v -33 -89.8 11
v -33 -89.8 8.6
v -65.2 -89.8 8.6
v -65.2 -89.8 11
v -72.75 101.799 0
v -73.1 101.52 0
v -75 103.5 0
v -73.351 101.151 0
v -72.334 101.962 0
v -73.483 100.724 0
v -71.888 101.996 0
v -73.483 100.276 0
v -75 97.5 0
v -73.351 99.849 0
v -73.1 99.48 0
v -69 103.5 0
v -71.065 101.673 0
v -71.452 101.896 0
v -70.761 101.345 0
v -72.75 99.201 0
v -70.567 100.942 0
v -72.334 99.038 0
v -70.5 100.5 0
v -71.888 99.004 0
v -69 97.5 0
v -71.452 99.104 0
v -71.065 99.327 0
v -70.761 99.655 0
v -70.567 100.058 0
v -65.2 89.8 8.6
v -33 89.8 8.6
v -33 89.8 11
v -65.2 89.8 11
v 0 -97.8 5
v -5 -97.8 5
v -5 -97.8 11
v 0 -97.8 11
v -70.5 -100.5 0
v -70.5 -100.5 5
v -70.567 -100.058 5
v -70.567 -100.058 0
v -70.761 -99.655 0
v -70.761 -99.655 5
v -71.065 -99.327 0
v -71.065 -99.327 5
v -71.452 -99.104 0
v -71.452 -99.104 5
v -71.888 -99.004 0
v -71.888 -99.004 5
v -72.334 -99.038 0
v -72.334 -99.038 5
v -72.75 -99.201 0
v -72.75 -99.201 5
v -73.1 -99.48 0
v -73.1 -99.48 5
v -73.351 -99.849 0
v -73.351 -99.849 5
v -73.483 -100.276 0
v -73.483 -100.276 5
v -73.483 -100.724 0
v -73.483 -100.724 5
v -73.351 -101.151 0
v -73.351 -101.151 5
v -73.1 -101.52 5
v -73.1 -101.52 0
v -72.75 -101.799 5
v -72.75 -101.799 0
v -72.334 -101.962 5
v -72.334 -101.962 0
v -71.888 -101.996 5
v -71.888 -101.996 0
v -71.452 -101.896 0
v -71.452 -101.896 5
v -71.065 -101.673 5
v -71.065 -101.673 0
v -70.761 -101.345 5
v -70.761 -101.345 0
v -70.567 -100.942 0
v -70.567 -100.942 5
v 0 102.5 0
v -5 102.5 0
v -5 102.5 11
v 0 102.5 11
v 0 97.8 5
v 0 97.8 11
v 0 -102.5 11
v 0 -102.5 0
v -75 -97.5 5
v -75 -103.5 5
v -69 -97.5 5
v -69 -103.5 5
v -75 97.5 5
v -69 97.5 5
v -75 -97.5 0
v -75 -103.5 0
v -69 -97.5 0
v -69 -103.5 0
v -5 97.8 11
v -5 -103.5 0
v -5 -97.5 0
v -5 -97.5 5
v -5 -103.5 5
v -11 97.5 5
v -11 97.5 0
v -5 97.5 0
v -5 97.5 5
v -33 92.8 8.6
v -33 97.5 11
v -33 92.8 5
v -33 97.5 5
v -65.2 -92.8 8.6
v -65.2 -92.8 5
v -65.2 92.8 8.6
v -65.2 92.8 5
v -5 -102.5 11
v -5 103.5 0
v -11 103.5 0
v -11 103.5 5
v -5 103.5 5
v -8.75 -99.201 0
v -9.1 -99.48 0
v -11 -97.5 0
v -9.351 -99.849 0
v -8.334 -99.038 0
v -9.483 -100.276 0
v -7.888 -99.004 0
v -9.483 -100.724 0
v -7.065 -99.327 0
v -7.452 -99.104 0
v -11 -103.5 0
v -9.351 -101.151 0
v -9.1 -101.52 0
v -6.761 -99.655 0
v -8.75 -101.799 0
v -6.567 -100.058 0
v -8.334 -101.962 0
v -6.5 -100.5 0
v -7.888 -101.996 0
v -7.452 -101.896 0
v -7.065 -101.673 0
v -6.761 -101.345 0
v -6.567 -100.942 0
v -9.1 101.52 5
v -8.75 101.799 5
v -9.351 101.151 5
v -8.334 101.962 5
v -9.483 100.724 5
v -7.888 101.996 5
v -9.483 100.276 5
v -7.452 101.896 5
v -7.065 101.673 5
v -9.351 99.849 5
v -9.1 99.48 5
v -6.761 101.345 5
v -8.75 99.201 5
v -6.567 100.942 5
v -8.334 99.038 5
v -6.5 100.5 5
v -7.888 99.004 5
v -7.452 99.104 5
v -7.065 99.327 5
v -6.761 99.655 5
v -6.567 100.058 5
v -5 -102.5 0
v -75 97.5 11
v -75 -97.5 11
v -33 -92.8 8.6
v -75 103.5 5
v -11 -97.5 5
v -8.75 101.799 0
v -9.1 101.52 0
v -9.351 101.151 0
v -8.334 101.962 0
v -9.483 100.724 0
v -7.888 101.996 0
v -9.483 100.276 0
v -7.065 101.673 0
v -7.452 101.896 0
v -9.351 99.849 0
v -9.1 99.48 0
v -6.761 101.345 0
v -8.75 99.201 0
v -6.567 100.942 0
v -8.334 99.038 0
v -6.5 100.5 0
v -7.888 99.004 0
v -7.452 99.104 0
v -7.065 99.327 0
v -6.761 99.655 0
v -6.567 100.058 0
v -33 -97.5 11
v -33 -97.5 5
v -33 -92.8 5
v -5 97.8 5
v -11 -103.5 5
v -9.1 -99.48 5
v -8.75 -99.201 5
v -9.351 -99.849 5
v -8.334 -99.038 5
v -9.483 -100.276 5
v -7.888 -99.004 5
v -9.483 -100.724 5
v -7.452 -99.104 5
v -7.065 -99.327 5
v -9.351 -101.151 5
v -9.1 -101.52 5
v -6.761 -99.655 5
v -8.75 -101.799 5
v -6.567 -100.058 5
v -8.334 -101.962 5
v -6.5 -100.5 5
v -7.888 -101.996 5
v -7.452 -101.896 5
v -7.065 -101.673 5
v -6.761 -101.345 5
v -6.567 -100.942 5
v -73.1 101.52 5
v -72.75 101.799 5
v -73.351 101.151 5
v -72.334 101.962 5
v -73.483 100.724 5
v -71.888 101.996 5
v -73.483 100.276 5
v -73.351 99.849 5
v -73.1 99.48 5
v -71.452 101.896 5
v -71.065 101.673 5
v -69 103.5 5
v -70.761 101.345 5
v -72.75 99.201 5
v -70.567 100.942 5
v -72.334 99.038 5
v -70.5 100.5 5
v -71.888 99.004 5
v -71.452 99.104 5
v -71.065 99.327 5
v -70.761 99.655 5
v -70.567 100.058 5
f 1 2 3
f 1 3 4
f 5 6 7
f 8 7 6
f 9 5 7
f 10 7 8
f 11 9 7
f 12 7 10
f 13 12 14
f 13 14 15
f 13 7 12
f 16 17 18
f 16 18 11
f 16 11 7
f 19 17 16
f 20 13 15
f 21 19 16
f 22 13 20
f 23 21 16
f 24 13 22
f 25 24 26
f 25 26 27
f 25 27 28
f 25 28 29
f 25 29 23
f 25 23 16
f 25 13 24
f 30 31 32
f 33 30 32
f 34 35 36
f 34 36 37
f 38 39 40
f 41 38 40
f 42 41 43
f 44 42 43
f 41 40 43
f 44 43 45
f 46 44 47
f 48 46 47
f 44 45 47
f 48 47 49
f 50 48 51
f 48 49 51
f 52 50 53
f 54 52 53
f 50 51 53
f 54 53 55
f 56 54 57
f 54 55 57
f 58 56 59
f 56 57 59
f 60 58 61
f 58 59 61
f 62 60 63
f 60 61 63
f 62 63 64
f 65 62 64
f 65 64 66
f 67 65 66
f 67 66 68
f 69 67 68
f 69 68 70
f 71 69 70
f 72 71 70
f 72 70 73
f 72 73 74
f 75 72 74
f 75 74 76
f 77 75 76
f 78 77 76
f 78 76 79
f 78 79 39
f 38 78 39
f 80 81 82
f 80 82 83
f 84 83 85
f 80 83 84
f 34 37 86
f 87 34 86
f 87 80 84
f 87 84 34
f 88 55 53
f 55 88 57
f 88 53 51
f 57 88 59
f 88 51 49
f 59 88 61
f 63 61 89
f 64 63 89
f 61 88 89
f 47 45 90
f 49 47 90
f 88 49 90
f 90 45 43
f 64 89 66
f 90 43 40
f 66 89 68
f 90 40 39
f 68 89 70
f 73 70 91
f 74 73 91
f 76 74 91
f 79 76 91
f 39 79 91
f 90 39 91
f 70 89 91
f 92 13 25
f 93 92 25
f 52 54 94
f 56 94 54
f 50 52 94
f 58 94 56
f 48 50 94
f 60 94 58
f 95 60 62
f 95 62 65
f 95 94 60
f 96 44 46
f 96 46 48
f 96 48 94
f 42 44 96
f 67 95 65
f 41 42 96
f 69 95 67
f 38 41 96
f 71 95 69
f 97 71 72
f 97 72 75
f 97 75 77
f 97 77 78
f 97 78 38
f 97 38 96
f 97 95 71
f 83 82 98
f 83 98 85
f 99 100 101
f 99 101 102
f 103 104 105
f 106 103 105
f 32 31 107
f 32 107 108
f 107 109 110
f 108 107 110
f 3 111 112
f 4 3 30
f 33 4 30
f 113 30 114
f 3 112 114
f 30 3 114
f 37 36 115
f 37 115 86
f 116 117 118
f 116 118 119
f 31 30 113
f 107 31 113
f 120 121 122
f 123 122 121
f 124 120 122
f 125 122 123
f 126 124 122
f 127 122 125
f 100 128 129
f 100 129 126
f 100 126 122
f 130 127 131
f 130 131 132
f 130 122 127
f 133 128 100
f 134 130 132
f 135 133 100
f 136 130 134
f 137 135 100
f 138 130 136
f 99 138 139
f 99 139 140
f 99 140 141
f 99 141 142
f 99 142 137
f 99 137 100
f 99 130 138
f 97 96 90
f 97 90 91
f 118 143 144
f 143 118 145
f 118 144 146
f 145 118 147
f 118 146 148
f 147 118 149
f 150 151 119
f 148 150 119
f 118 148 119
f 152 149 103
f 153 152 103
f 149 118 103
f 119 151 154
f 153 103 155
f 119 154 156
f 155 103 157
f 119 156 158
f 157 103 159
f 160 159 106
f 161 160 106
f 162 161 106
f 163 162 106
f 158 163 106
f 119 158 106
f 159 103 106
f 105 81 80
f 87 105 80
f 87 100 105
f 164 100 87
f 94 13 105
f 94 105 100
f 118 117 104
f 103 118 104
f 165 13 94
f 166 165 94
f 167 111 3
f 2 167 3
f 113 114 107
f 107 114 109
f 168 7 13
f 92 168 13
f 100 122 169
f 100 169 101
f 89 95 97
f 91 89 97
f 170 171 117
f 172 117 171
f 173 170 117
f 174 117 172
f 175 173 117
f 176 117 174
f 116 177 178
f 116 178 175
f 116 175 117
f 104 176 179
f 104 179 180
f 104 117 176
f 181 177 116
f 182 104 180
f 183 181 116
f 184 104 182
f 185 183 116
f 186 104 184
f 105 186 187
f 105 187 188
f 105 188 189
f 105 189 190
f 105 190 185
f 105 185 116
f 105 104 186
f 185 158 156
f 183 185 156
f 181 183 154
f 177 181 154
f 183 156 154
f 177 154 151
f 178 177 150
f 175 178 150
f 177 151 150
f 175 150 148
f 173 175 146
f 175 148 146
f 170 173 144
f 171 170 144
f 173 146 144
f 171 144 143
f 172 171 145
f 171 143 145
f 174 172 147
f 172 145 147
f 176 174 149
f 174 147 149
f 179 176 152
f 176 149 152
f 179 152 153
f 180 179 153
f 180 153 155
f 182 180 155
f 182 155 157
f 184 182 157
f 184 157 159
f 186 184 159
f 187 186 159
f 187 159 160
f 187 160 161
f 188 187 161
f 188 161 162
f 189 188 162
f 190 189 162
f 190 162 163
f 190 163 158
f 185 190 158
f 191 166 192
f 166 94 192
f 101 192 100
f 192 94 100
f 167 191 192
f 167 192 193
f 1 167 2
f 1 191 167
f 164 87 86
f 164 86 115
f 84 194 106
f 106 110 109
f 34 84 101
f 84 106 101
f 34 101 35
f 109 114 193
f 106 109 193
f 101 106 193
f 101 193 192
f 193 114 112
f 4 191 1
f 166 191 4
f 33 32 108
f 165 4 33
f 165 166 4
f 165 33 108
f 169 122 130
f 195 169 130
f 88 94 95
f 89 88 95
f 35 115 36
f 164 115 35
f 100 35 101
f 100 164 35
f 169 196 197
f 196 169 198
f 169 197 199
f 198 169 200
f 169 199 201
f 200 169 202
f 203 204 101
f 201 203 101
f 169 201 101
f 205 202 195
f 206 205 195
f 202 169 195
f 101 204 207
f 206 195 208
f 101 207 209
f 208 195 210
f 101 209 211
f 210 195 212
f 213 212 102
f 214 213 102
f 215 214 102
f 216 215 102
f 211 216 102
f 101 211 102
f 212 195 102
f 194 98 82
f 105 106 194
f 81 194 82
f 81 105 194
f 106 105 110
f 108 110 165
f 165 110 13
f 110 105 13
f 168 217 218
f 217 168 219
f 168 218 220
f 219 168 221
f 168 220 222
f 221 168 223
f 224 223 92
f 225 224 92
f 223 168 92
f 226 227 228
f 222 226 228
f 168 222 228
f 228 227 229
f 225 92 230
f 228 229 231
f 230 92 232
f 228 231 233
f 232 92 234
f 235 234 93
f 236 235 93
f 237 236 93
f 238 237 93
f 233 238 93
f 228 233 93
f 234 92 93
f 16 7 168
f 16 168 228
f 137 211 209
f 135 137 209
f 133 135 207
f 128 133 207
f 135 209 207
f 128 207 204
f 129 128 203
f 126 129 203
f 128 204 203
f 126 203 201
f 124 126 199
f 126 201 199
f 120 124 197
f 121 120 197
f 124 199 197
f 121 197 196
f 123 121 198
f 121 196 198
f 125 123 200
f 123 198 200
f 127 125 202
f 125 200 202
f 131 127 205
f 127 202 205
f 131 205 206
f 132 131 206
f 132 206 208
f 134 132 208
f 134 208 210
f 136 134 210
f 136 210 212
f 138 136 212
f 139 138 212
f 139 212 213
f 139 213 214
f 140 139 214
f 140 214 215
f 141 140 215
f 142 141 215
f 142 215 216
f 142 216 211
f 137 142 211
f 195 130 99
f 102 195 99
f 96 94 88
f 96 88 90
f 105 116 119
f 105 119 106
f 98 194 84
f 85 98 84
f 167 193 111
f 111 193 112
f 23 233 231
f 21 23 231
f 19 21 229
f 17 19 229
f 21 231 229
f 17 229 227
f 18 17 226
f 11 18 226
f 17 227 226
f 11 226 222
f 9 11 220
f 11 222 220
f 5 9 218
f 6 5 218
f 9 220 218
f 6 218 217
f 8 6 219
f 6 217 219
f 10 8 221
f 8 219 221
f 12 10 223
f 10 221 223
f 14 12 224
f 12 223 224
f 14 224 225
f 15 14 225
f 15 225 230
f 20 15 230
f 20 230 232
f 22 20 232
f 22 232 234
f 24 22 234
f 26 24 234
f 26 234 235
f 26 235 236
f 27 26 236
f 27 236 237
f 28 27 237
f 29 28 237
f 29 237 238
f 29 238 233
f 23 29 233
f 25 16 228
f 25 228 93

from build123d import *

# Parameters (mm, degrees)
BOSS_EXTRUDE1_DEPTH   = 5
SKETCH4_W             = 5
SKETCH4_H             = 4.7
BOSS_EXTRUDE2_DEPTH   = 6
SKETCH5_W             = 3
SKETCH5_H             = 2.4
BOSS_EXTRUDE3_DEPTH   = 32.2
SKETCH6_W             = 6
SKETCH6_H             = 6
BOSS_EXTRUDE4_DEPTH   = 5
BOSS_EXTRUDE4_2_DEPTH = 5
BOSS_EXTRUDE4_3_DEPTH = 5
BOSS_EXTRUDE4_4_DEPTH = 5
SKETCH7_R             = 1.5
CUT_EXTRUDE1_DEPTH    = 6


with BuildPart() as part:
    # Sketch1 → Boss-Extrude1 (new body)
    with BuildSketch(Plane(origin=(0, 0, 0), x_dir=(0, 1, 0), z_dir=(0, 0, 1))):
        Polygon((-97.5, 5), (-97.5, 75), (97.5, 75), (97.5, 5), (102.5, 5), (102.5, 0), (-102.5, 0), (-102.5, 5), align=None)
    extrude(amount=BOSS_EXTRUDE1_DEPTH)

    # Sketch4 → Boss-Extrude2 (add)
    with BuildSketch(Plane.XY.offset(5)):
        Polygon((-75, 97.5), (-75, -97.5), (-33, -97.5), (-33, -92.8), (-65.2, -92.8), (-65.2, 92.8), (-33, 92.8), (-33, 97.5), align=None)
        with Locations((-2.5, 100.15)):
            Rectangle(SKETCH4_W, SKETCH4_H)
        with Locations((-2.5, -100.15)):
            Rectangle(SKETCH4_W, SKETCH4_H)
    extrude(amount=BOSS_EXTRUDE2_DEPTH)

    # Sketch5 → Boss-Extrude3 (add)
    with BuildSketch(Plane.YZ.offset(-65.2)):
        with Locations((-91.3, 9.8)):
            Rectangle(SKETCH5_W, SKETCH5_H)
        with Locations((91.3, 9.8)):
            Rectangle(SKETCH5_W, SKETCH5_H)
    extrude(amount=BOSS_EXTRUDE3_DEPTH)


with BuildPart() as body_2:
    # Sketch6 → Boss-Extrude4 (new body)
    with BuildSketch(Plane(origin=(0, 0, 0), x_dir=(1, 0, 0), z_dir=(0, 0, -1))):
        with Locations((-8, 100.5)):
            Rectangle(SKETCH6_W, SKETCH6_H)
    extrude(amount=-BOSS_EXTRUDE4_DEPTH)


with BuildPart() as body_3:
    # Sketch6 → Boss-Extrude4 2 (new body)
    with BuildSketch(Plane(origin=(0, 0, 0), x_dir=(1, 0, 0), z_dir=(0, 0, -1))):
        with Locations((-72, 100.5)):
            Rectangle(SKETCH6_W, SKETCH6_H)
    extrude(amount=-BOSS_EXTRUDE4_2_DEPTH)


with BuildPart() as body_4:
    # Sketch6 → Boss-Extrude4 3 (new body)
    with BuildSketch(Plane(origin=(0, 0, 0), x_dir=(1, 0, 0), z_dir=(0, 0, -1))):
        with Locations((-8, -100.5)):
            Rectangle(SKETCH6_W, SKETCH6_H)
    extrude(amount=-BOSS_EXTRUDE4_3_DEPTH)


with BuildPart() as body_5:
    # Sketch6 → Boss-Extrude4 4 (new body)
    with BuildSketch(Plane(origin=(0, 0, 0), x_dir=(1, 0, 0), z_dir=(0, 0, -1))):
        with Locations((-72, -100.5)):
            Rectangle(SKETCH6_W, SKETCH6_H)
    extrude(amount=-BOSS_EXTRUDE4_4_DEPTH)


with BuildPart() as cut_extrude1_tool:
    # Sketch7 → Cut-Extrude1 (new body, through all)
    with BuildSketch(Plane.XY.offset(5)):
        with Locations((-8, -100.5)):
            Circle(SKETCH7_R)
        with Locations((-72, -100.5)):
            Circle(SKETCH7_R)
        with Locations((-8, 100.5)):
            Circle(SKETCH7_R)
        with Locations((-72, 100.5)):
            Circle(SKETCH7_R)
    extrude(amount=-CUT_EXTRUDE1_DEPTH)


with BuildPart() as body_2_1:
    add(body_2.part)

    # Cut-Extrude1: cut by cut_extrude1_tool
    add(cut_extrude1_tool.part, mode=Mode.SUBTRACT)


with BuildPart() as body_3_1:
    add(body_3.part)

    # Cut-Extrude1: cut by cut_extrude1_tool
    add(cut_extrude1_tool.part, mode=Mode.SUBTRACT)


with BuildPart() as body_4_1:
    add(body_4.part)

    # Cut-Extrude1: cut by cut_extrude1_tool
    add(cut_extrude1_tool.part, mode=Mode.SUBTRACT)


with BuildPart() as body_5_1:
    add(body_5.part)

    # Cut-Extrude1: cut by cut_extrude1_tool
    add(cut_extrude1_tool.part, mode=Mode.SUBTRACT)


solid = Compound([part.part, body_2_1.part, body_3_1.part, body_4_1.part, body_5_1.part])
